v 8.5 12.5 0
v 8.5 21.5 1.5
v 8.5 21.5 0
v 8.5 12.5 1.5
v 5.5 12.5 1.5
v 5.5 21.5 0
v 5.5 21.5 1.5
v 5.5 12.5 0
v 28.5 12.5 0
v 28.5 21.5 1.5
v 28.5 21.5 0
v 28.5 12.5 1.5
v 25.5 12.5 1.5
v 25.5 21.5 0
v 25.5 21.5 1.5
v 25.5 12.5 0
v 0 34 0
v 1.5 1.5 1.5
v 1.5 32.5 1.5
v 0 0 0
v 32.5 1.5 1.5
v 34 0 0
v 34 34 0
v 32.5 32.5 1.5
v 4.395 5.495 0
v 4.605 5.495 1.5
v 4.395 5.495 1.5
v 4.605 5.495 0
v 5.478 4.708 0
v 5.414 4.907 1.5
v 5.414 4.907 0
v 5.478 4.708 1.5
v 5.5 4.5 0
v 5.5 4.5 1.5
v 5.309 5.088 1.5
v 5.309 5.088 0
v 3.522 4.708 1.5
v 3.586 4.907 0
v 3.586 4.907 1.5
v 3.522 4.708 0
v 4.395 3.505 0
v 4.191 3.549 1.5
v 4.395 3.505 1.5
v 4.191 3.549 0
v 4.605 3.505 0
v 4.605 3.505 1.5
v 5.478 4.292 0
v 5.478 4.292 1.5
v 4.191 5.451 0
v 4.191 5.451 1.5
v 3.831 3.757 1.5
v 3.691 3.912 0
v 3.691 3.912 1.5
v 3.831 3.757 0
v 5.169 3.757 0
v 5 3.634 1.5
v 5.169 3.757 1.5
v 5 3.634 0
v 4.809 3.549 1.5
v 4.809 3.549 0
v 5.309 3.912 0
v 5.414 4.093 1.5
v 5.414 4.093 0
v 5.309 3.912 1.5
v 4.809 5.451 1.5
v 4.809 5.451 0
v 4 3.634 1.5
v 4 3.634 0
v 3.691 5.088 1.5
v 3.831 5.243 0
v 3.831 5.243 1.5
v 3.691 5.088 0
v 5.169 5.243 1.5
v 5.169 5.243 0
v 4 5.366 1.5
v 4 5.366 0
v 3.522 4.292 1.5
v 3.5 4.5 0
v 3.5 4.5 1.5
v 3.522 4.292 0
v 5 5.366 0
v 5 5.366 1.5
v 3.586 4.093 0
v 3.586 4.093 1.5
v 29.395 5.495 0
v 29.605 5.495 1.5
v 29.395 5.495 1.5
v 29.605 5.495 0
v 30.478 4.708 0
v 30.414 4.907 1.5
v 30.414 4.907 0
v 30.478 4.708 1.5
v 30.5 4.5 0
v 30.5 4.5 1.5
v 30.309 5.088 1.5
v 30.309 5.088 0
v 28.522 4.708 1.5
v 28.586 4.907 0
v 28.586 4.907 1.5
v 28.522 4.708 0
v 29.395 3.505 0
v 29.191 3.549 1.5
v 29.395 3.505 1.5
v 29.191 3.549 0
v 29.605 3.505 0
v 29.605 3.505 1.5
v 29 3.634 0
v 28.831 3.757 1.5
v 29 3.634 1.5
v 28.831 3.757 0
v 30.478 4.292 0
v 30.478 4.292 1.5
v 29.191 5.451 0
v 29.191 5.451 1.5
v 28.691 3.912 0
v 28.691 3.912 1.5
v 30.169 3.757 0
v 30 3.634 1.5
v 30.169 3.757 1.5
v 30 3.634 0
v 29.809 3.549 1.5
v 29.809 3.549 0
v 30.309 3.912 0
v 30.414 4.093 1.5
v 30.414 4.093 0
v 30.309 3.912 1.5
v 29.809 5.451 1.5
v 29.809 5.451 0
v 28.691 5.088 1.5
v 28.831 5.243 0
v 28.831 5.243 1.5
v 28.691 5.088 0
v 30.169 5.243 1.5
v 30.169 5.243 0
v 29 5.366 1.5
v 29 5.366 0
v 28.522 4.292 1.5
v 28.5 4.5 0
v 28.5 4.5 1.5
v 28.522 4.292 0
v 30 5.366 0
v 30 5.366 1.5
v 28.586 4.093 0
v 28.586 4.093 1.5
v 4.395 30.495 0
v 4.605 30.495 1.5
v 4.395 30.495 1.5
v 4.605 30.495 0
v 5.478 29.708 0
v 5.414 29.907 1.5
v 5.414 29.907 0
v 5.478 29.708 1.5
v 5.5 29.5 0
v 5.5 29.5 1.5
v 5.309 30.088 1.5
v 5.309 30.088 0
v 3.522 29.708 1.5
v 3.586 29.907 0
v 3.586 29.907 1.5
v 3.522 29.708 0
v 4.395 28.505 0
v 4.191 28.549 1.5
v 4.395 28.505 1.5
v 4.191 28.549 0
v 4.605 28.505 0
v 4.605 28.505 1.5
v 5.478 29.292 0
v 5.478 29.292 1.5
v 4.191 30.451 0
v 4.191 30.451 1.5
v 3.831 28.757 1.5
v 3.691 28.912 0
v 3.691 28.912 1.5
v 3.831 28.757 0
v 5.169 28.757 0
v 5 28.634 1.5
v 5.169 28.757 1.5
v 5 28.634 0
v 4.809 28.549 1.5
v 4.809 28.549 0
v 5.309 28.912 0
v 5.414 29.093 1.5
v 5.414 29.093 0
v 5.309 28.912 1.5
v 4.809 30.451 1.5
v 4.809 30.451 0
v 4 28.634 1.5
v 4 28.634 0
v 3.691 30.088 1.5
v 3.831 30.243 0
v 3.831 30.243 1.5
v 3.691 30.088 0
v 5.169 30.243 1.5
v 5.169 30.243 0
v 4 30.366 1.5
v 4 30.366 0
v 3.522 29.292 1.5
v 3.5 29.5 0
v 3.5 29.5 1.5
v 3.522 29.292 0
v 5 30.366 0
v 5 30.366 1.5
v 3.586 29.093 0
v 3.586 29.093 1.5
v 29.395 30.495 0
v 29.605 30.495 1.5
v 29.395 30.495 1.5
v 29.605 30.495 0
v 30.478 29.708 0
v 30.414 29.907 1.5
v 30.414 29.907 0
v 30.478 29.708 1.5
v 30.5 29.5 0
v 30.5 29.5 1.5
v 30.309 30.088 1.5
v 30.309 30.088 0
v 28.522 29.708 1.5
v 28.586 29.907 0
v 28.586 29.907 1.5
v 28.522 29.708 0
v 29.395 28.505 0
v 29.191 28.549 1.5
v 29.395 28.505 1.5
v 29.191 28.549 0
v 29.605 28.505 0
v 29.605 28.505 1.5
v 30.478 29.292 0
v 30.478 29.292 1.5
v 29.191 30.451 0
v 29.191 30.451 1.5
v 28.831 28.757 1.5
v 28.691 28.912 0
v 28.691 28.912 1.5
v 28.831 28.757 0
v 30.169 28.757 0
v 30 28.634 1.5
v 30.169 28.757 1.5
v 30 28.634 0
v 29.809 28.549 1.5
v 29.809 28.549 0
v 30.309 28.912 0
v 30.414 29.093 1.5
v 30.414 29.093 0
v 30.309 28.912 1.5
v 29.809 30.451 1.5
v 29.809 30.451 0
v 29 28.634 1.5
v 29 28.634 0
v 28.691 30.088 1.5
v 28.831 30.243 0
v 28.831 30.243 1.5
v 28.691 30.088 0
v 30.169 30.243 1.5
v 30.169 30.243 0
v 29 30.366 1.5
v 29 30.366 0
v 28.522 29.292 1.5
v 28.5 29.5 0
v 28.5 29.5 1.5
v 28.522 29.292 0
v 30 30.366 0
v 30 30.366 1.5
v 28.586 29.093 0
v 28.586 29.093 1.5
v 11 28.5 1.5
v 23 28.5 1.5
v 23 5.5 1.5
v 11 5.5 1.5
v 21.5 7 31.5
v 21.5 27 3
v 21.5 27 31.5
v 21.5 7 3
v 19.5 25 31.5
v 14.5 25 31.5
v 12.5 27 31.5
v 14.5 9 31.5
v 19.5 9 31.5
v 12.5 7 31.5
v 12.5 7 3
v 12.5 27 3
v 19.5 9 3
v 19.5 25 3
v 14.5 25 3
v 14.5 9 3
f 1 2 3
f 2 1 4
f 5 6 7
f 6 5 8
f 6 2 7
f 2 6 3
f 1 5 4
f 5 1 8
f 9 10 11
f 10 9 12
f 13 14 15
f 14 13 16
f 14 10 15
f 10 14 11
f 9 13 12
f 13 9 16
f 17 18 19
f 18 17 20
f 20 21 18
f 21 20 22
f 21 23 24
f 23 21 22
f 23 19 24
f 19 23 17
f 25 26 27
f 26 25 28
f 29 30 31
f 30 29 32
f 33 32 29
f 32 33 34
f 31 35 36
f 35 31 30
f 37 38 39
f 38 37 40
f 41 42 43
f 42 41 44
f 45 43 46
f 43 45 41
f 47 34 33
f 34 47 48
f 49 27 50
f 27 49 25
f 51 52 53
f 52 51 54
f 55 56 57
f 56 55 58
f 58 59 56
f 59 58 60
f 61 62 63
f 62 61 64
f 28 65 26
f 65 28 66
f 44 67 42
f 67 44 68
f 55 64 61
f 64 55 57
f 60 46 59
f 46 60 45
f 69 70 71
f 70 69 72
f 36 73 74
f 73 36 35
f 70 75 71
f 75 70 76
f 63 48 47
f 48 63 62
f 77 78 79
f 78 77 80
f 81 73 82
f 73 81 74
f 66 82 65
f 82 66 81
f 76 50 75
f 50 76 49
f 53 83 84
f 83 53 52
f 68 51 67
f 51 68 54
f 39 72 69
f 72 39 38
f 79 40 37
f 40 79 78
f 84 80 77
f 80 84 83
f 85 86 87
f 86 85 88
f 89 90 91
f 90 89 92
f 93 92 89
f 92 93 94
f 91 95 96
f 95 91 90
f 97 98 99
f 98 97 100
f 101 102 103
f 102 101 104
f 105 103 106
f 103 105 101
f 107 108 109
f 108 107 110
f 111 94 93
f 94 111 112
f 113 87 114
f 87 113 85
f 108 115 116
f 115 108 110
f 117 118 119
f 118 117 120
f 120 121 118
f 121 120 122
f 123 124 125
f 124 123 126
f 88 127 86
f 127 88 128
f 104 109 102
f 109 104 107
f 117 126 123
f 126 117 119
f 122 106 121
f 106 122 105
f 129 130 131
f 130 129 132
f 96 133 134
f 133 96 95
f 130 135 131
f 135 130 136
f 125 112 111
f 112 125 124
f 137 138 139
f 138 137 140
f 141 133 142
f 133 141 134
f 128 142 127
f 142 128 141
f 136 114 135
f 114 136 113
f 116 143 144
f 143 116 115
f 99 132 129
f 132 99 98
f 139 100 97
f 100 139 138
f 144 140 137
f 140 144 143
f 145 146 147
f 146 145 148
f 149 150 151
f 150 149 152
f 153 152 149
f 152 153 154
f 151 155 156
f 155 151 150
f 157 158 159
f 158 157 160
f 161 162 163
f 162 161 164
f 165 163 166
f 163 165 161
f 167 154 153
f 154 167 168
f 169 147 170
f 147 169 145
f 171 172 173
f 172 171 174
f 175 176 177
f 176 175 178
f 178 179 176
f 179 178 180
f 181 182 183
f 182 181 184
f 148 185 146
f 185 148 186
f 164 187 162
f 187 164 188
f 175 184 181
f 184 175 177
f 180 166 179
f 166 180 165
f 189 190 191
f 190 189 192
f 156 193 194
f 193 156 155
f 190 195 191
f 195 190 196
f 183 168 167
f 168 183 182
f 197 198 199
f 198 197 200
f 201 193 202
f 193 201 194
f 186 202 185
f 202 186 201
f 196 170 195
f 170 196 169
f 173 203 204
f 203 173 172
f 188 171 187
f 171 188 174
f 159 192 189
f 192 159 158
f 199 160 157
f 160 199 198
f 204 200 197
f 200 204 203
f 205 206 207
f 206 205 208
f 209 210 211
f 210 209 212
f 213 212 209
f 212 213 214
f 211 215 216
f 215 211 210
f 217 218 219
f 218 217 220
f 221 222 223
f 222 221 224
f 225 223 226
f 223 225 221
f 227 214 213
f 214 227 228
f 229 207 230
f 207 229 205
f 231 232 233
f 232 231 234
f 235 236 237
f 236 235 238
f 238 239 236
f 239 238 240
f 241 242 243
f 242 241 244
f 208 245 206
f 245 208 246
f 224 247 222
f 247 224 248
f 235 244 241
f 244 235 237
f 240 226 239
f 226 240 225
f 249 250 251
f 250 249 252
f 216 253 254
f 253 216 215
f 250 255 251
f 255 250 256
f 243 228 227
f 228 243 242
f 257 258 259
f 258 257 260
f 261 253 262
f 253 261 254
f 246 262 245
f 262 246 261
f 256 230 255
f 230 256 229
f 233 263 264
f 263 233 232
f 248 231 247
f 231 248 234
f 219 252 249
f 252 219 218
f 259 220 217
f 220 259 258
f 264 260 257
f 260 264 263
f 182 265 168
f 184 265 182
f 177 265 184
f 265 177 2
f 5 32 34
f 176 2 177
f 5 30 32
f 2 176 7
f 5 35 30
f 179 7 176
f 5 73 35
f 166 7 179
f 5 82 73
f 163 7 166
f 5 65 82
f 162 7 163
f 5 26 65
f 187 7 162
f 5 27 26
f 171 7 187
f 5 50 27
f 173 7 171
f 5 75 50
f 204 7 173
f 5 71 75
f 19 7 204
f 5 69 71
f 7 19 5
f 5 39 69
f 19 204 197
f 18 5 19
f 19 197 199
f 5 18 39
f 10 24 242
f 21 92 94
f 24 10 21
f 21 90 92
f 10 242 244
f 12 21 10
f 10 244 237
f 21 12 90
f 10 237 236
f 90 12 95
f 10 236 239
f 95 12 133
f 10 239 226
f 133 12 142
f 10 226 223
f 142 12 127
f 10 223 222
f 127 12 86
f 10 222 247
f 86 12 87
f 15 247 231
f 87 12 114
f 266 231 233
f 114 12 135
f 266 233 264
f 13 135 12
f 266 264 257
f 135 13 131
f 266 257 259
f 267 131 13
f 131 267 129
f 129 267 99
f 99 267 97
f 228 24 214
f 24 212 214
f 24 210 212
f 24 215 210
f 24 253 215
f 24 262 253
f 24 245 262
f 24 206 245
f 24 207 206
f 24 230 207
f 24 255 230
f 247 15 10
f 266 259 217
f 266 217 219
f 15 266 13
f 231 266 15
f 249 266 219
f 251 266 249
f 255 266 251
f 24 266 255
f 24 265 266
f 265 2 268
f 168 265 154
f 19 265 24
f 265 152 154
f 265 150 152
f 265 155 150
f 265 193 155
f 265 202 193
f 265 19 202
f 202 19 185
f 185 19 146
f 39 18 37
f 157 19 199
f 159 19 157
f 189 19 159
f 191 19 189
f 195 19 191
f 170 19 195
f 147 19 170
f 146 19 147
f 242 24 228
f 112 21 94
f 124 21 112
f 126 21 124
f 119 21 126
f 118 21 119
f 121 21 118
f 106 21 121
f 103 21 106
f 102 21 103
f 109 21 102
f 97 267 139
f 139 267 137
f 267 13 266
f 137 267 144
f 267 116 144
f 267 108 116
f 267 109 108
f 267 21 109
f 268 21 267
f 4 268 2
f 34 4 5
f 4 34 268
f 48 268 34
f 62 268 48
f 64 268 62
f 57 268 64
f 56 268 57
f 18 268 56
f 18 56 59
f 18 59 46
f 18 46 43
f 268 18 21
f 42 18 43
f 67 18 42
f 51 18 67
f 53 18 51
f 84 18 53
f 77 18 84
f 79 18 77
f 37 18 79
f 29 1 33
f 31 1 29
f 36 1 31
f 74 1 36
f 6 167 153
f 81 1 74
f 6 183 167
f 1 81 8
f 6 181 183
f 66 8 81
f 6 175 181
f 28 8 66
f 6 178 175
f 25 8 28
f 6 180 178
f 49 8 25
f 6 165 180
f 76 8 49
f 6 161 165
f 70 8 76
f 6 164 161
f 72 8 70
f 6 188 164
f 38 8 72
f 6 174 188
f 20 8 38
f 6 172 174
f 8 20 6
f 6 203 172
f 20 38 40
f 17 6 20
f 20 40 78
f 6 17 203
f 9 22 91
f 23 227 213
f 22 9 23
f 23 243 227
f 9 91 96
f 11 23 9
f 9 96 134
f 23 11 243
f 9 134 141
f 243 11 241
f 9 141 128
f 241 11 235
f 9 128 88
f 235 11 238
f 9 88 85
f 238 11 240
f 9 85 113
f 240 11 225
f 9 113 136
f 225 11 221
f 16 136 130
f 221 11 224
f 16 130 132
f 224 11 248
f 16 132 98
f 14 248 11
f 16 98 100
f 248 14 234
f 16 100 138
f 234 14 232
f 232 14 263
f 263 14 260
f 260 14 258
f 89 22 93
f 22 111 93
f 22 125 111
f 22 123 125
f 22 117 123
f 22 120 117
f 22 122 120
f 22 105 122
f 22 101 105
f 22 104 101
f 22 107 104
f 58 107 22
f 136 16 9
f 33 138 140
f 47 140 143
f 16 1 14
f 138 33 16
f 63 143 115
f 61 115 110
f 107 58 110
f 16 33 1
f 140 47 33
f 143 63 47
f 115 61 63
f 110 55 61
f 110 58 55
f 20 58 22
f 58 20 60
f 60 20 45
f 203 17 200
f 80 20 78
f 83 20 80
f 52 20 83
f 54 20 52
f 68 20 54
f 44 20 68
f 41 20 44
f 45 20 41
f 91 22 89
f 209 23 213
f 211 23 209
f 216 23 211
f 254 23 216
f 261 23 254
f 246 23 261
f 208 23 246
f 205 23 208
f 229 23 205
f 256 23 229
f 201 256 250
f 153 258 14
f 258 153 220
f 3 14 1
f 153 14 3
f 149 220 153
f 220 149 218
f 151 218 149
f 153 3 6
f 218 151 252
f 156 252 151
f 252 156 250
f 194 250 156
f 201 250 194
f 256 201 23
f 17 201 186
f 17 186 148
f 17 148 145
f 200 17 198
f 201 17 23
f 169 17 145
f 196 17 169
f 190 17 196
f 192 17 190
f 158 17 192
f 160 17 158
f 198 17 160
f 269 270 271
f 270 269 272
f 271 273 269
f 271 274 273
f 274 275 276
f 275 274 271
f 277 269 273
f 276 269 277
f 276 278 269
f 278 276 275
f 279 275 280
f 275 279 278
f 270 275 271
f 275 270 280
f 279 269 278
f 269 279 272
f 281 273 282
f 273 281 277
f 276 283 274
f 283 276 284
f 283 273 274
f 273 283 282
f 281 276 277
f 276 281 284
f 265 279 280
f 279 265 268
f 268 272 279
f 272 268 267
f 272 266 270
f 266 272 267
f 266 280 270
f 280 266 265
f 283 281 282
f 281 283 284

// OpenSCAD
// title      : RoboGen parametric A part
// author     : Alice Concordel

partA(0.03,0); //the first parameter is the length of the joint, the second parameter is the angle beta (only for non-planar robots)

module partA(length, beta)
{
//plate parameters
	lengthSlide = 34;
	widthSlide = 34;
	heightSlide = 1.5;

	radiusHole = 1;

//wire hole parameters
	lengthWire = 3;
	widthWire = 9;
	heightWire = heightSlide;

//shaft part parameters
	lengthShaft = 20;
	widthShaft = 9;

// apply transformations to the parameter
length = length*1000; //convert to mm
	union()
	{
		difference()
		{
			// starting plate
			cube([lengthSlide,widthSlide,heightSlide]);
		
			union()
			{
			// chamfer the edges
				rotate ([0,-45,0]) cube([3,widthSlide,3]);
				rotate([45,0,0]) cube([lengthSlide,3,3]);
				translate([lengthSlide,0,0]) rotate([0,-45,0]) cube([3,widthSlide,3]);
				translate([0,widthSlide,0]) rotate([45,0,0]) cube([lengthSlide,3,3]);

			// holes in the plate
					//round
				translate([4.5,4.5,-0.5]) cylinder(r = radiusHole, h = heightSlide+1, $fn = 30);
				translate([lengthSlide-4.5,4.5,-0.5]) cylinder(r = radiusHole, h = heightSlide+1, $fn = 30);
				translate([4.5,widthSlide-4.5,-0.5]) cylinder(r = radiusHole, h = heightSlide+1, $fn = 30);
				translate([lengthSlide-4.5,widthSlide-4.5,-0.5]) cylinder(r = radiusHole, h = heightSlide+1, $fn = 30);
					
					//rectangular holes (only present if the shaft is not rotated)
				if(beta == 0){
				translate([7-lengthWire/2,widthSlide/2-widthWire/2,-0.5]) cube([lengthWire,widthWire,heightSlide+1]);
				translate([lengthSlide-7-lengthWire/2,widthSlide/2-widthWire/2,-0.5]) cube([lengthWire,widthWire,heightSlide+1]);
				}
			}
		}

	//the shaft
		//========================== beta paramter below: rotates the whole thing if needed
		translate([lengthSlide/2,widthSlide/2,0]) rotate([0,0,beta]) translate([-lengthSlide/2,-widthSlide/2,0]) 
	union()
	{
		//main long part 
		//========================== length parameter below
			difference()
			{
			translate([lengthSlide/2-widthShaft/2,widthSlide/2-lengthShaft/2,0]) cube([widthShaft,lengthShaft,length+heightSlide]);
			translate([lengthSlide/2-(widthShaft-4)/2,widthSlide/2-(lengthShaft-4)/2,heightSlide]) cube([widthShaft-4,lengthShaft-4,length+0.5]);
			}

		//chamfer the edges of the shaft base
			difference()
			{
				translate([lengthSlide/2-(widthShaft+3)/2,widthSlide/2-(lengthShaft+3)/2]) cube([widthShaft+3,lengthShaft+3,3]);
				union()
				{
				translate([lengthSlide/2-widthShaft/2-1.5,0,1.5]) rotate ([0,-45,0]) cube([1.5*sqrt(2),widthSlide,1.5*sqrt(2)]);
				translate([0,widthSlide/2-lengthShaft/2-1.5,1.5]) rotate([45,0,0]) cube([lengthSlide,1.5*sqrt(2),1.5*sqrt(2)]);
				translate([lengthSlide/2+widthShaft/2+1.5,0,1.5]) rotate([0,-45,0]) cube([1.5*sqrt(2),widthSlide,1.5*sqrt(2)]);
				translate([0,widthSlide/2+lengthShaft/2+1.5,1.5]) rotate([45,0,0]) cube([lengthSlide,1.5*sqrt(2),1.5*sqrt(2)]);
				}
			}
		}
	}
}
